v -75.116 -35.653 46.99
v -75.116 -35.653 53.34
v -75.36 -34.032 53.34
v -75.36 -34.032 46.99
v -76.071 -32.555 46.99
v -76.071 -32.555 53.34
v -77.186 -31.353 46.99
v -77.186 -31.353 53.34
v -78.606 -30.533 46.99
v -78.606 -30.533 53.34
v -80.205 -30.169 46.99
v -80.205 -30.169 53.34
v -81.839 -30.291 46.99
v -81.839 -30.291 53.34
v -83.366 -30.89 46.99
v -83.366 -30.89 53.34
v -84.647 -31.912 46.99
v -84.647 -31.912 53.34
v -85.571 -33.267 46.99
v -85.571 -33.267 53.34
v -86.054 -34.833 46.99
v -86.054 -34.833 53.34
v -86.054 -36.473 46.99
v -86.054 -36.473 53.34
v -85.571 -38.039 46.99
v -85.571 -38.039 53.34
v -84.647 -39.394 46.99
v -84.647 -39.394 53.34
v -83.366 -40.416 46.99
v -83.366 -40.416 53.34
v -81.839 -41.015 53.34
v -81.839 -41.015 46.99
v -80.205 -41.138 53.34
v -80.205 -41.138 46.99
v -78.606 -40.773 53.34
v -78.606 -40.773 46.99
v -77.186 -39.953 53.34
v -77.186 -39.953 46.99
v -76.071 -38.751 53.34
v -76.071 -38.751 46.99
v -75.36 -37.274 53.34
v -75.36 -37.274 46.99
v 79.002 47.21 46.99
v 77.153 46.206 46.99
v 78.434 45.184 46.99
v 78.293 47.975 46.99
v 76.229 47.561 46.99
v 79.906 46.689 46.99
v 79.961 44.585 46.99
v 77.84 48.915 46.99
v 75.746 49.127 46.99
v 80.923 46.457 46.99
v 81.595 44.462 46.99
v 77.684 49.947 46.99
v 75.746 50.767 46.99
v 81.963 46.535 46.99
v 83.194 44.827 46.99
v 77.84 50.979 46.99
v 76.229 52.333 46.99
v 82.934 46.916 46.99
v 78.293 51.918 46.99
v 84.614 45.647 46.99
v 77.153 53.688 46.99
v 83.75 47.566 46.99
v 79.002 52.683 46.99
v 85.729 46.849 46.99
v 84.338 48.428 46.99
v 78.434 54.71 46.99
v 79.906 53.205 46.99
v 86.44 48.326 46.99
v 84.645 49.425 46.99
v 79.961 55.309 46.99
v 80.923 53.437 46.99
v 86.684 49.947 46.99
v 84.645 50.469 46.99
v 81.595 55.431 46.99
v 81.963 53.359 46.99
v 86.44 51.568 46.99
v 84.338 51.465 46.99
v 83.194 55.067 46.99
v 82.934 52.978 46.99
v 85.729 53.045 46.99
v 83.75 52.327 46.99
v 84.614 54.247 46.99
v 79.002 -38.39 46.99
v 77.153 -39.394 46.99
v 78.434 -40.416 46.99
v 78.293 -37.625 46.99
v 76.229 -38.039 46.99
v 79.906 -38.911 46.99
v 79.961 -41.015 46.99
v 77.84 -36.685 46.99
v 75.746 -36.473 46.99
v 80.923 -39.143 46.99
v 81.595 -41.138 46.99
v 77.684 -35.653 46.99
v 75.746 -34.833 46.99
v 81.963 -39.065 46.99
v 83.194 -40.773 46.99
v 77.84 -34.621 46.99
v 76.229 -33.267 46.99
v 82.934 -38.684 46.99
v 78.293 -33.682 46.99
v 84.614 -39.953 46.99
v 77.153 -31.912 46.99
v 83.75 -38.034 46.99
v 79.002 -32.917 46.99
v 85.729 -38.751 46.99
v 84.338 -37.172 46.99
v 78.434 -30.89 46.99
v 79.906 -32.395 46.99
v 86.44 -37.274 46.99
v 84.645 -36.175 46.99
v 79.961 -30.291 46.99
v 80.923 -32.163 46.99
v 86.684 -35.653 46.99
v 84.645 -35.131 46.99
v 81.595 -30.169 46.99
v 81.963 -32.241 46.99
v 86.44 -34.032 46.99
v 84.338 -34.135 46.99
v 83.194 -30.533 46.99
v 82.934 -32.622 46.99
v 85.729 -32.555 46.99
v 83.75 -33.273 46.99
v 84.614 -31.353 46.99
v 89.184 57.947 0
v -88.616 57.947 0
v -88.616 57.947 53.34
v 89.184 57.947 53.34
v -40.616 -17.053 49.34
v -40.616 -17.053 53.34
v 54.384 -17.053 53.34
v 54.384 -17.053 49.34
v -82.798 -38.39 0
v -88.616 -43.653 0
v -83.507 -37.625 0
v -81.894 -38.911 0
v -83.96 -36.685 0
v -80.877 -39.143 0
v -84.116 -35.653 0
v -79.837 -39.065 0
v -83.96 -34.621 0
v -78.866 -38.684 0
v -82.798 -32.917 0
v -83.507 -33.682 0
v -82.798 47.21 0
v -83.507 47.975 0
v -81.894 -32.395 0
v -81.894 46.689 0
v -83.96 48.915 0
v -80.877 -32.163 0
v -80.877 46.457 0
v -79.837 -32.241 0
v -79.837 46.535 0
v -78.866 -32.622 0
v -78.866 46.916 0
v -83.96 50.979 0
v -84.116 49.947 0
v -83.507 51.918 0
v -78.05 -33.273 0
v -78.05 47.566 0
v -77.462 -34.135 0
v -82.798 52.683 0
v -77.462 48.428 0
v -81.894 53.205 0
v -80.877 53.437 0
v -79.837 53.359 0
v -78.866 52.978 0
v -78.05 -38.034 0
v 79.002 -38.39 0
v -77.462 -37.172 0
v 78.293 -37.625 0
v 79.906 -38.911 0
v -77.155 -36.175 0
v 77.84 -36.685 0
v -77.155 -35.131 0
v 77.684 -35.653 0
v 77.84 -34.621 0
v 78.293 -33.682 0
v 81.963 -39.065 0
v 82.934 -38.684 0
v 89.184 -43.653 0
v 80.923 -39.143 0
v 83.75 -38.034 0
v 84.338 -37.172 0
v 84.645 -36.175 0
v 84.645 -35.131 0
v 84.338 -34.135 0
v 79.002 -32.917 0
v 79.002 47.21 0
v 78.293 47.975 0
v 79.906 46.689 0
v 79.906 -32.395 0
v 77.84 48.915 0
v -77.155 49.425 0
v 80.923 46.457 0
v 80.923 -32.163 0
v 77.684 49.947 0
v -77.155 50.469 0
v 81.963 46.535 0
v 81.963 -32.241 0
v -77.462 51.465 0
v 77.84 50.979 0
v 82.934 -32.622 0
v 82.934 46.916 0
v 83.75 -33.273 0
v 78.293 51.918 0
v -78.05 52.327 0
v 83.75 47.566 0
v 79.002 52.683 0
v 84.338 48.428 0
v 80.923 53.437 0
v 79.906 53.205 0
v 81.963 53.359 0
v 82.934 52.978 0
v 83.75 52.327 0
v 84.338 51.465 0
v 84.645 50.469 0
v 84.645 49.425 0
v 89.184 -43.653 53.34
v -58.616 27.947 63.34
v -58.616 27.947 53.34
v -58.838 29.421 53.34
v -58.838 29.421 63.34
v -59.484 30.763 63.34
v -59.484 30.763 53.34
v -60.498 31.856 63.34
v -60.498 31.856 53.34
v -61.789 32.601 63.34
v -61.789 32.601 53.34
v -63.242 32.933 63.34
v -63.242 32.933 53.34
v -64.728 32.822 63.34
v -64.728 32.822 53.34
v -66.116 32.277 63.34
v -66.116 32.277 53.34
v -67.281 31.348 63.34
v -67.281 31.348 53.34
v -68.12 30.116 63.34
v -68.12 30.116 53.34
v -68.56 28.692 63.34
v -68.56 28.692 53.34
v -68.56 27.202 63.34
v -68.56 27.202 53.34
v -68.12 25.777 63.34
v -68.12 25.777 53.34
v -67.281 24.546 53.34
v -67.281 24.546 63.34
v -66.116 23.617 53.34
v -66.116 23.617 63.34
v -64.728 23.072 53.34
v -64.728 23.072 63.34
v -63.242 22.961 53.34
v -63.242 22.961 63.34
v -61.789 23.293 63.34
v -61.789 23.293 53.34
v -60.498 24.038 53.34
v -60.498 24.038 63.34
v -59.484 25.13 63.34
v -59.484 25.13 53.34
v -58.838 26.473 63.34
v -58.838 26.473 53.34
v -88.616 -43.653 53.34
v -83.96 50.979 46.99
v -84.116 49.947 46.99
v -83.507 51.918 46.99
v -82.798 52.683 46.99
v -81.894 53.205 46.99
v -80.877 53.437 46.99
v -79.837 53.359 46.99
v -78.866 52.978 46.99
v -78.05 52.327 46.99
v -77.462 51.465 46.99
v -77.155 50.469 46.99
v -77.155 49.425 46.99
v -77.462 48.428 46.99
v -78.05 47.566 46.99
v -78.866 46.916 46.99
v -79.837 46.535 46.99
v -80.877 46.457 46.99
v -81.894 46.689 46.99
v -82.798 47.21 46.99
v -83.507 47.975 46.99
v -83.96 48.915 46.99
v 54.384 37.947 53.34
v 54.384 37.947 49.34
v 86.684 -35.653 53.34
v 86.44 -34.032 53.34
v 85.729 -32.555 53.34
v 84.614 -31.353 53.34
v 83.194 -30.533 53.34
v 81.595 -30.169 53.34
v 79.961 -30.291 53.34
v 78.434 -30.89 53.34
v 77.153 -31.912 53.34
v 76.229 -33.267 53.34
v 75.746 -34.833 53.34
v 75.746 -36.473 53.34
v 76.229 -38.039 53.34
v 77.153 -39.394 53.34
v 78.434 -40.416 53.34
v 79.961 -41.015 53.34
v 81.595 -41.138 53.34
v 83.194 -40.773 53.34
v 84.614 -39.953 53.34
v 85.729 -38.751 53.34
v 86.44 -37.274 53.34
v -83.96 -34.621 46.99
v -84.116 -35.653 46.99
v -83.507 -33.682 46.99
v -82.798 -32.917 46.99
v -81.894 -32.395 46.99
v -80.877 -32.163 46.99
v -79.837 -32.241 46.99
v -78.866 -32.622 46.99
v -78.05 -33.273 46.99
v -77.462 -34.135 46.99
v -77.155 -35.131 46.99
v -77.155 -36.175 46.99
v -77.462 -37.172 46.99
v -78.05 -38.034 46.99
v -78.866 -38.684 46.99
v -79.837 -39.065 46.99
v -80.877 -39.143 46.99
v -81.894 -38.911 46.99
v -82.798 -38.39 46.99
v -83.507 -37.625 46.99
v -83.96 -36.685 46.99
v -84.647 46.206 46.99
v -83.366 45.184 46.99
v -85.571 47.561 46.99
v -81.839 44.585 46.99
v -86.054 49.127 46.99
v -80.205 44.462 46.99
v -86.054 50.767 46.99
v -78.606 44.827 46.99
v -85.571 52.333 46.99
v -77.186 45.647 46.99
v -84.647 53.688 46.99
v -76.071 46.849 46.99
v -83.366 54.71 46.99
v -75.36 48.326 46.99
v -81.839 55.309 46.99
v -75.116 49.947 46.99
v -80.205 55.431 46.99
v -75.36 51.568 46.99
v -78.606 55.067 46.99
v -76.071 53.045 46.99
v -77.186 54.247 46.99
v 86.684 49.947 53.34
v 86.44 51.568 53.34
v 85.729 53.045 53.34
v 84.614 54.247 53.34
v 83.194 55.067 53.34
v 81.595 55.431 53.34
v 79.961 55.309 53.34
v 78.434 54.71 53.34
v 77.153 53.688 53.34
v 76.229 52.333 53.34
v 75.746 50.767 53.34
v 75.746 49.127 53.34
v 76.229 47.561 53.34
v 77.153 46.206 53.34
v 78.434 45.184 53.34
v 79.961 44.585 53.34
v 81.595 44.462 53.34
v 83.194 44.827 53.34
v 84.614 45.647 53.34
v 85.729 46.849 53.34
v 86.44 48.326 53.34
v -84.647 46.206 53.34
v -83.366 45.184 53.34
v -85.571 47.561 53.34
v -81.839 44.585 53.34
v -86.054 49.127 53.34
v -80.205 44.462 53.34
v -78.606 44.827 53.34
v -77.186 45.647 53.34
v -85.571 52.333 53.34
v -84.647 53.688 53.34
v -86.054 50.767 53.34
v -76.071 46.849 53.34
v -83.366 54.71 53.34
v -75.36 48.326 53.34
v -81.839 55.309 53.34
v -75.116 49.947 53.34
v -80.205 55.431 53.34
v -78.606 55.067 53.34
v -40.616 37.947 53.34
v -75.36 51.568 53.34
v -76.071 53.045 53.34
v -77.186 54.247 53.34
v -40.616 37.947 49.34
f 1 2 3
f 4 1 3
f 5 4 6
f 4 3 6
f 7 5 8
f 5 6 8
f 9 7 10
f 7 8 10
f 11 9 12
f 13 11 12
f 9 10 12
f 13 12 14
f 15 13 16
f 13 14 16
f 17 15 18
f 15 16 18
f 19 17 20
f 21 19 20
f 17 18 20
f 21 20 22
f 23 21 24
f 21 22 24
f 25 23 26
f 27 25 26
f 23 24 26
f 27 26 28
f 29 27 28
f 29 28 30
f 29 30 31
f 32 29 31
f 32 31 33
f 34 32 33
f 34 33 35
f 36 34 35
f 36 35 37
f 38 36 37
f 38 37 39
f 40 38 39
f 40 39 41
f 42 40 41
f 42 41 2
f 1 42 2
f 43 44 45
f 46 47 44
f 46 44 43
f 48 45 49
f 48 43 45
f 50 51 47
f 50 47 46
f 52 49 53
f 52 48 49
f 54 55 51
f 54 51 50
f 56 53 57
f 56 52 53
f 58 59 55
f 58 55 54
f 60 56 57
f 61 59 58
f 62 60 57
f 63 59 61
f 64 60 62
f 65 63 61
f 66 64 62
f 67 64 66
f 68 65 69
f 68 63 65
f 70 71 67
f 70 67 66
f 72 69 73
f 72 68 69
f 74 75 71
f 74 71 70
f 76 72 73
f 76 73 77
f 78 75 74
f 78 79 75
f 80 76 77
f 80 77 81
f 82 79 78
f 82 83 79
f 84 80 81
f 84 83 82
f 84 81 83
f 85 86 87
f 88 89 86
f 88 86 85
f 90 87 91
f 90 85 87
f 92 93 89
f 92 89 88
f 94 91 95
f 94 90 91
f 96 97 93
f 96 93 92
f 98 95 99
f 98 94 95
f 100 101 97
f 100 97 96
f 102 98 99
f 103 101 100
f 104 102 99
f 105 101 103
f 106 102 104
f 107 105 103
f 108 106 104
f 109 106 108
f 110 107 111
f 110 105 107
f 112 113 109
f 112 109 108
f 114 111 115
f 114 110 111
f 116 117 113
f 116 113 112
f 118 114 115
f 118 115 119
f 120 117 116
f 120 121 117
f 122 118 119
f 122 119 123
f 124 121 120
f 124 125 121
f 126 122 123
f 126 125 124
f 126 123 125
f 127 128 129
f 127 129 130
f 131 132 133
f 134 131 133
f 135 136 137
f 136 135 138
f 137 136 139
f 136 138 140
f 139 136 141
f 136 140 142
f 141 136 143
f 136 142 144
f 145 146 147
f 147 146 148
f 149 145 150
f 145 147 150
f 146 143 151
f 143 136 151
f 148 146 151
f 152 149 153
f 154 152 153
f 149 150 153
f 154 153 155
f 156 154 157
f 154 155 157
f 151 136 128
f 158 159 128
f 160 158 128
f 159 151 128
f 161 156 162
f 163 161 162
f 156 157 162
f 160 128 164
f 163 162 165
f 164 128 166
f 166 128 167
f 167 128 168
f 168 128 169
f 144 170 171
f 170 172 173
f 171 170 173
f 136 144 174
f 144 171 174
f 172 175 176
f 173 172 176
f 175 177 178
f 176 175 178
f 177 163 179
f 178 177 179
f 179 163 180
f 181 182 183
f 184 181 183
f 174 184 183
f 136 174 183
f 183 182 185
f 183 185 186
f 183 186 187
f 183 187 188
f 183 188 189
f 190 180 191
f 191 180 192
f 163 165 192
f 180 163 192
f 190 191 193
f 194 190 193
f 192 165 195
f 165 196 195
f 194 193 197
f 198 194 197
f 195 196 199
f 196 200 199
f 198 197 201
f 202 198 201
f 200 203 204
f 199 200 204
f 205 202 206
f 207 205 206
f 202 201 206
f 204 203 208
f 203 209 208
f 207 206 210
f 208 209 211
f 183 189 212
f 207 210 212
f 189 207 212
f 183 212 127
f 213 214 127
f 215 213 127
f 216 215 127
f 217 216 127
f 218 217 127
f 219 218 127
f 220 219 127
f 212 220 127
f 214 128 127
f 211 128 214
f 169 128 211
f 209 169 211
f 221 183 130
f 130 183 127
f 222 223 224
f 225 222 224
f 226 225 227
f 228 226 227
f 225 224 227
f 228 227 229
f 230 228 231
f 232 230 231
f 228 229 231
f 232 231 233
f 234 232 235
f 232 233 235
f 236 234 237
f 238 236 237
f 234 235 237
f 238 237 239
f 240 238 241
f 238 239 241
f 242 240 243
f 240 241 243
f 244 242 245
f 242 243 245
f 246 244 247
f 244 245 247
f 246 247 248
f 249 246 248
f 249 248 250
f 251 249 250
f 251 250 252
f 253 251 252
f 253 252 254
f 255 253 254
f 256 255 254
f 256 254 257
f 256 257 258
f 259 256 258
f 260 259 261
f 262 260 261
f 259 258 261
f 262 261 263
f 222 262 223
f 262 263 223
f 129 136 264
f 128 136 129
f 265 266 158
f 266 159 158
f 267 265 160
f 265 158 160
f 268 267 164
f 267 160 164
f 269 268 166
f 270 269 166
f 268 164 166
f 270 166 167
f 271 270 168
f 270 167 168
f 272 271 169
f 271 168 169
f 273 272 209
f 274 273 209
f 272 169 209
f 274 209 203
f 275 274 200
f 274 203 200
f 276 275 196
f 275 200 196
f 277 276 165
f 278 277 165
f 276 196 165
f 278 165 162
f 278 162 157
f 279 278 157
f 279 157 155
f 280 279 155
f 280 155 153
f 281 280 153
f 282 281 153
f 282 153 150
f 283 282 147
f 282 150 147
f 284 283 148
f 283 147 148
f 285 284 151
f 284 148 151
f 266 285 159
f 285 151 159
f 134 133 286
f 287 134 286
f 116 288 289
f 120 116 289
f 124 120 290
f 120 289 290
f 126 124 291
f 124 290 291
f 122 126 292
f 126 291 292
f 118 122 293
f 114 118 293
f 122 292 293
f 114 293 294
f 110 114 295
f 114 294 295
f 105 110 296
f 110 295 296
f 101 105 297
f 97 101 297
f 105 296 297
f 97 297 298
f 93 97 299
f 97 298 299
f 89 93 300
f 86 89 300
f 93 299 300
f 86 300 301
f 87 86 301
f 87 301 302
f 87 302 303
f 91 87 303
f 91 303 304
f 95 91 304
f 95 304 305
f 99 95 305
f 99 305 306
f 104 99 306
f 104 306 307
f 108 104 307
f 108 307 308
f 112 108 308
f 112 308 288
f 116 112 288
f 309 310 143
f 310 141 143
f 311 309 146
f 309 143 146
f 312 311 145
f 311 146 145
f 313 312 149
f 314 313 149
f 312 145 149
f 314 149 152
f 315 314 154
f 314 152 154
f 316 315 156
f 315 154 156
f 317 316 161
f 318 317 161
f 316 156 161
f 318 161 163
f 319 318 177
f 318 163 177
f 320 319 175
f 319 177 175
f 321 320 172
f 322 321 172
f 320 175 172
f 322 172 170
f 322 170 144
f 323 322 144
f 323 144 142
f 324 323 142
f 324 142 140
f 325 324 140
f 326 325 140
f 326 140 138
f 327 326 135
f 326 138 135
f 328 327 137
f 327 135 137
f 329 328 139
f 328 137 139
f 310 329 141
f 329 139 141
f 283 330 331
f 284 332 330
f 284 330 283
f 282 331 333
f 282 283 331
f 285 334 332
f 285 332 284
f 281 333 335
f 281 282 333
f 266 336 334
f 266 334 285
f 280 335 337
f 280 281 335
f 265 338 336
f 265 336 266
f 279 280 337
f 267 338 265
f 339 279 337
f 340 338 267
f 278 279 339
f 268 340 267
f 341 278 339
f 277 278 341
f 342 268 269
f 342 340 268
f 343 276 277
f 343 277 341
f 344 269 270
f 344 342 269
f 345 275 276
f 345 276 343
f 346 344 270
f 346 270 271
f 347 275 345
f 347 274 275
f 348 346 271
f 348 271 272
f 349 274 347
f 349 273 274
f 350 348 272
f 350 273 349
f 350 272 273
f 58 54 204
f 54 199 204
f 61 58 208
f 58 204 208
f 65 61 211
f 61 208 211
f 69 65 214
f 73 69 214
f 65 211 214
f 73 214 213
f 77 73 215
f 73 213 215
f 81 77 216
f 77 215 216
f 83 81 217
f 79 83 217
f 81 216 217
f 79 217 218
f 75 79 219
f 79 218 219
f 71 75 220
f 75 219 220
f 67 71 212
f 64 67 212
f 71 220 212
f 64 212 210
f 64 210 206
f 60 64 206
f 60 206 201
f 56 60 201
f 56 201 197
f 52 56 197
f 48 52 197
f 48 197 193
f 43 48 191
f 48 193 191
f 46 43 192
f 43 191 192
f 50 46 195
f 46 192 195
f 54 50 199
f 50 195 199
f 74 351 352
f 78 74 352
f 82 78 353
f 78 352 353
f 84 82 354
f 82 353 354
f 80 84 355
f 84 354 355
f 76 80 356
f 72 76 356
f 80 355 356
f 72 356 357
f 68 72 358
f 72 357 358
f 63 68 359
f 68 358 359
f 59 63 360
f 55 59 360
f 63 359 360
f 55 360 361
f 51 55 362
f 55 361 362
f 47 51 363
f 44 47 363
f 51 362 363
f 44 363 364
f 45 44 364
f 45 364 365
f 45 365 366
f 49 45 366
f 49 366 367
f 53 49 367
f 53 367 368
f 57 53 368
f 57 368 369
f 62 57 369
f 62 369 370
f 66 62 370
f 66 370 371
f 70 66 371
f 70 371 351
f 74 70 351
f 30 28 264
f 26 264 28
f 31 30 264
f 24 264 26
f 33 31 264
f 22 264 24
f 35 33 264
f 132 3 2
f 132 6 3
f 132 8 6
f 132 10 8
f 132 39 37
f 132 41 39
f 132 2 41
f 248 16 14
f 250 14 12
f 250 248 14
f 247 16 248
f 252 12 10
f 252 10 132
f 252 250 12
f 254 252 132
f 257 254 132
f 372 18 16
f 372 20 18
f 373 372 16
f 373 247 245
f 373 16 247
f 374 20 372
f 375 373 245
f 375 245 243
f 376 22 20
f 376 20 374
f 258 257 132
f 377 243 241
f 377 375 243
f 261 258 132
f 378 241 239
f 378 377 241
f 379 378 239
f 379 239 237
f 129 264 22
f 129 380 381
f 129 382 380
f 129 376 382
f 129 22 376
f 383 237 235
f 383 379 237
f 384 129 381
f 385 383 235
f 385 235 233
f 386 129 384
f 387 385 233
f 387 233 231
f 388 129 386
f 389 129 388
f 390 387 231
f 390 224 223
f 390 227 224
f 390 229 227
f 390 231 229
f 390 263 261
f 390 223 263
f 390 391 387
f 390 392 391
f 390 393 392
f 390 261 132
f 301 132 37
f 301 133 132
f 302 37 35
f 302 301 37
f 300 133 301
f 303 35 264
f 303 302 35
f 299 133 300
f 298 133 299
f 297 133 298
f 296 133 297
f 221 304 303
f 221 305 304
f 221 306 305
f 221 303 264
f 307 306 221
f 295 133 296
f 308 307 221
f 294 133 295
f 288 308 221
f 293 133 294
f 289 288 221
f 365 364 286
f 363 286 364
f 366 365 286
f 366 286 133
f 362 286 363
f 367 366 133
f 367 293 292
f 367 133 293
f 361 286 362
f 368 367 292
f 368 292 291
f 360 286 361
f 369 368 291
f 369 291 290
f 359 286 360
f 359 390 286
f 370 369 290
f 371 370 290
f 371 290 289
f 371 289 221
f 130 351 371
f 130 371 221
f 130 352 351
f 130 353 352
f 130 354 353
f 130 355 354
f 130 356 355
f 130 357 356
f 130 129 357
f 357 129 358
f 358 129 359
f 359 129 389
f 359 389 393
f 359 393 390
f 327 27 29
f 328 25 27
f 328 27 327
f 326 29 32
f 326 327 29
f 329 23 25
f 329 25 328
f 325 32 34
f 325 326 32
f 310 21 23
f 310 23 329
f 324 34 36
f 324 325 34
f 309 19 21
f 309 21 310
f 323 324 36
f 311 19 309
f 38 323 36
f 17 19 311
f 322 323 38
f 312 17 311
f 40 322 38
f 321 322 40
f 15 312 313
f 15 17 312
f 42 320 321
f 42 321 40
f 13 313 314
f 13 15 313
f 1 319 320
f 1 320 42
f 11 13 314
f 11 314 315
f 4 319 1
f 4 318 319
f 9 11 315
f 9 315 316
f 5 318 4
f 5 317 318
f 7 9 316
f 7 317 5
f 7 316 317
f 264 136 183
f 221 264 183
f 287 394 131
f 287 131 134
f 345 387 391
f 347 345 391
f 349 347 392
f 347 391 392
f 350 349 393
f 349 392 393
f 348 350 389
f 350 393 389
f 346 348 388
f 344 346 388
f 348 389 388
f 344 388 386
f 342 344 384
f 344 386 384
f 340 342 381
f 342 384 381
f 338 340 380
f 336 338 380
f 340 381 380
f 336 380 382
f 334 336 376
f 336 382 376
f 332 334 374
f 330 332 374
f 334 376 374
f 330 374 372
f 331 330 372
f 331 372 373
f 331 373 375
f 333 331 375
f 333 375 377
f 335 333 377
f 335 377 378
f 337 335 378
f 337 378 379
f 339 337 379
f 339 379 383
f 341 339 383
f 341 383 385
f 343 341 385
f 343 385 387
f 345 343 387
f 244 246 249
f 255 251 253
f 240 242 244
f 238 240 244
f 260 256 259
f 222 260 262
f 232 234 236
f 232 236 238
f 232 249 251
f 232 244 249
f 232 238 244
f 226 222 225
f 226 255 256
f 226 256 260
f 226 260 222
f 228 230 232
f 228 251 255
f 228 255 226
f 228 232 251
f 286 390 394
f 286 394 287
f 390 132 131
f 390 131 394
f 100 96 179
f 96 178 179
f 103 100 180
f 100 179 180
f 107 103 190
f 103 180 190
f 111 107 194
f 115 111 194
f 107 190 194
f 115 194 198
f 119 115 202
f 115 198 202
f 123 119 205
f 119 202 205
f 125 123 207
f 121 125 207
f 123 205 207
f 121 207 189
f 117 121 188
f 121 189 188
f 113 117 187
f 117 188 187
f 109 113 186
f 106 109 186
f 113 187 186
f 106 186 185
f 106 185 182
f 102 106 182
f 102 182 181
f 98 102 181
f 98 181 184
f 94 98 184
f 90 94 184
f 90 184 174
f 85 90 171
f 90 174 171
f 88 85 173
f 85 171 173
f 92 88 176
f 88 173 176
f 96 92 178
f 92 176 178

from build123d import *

# Parameters (mm, degrees)
F0_W           = 177.8
F0_H           = 101.6
F1_DEPTH       = 53.34
F2_W           = 95
F2_H           = 55
F3_DEPTH       = 4
F4_D           = 7
F4_CBORE_D     = 11
F4_CBORE_DEPTH = 6.35
F2_R           = 5
F5_DEPTH       = 10


with BuildPart() as f1:
    # F0 (on Top) → F1 (new body)
    with BuildSketch(Plane.XY):
        with Locations((0.284396, 7.146878)):
            Rectangle(F0_W, F0_H)
    extrude(amount=F1_DEPTH)

    # F2 (on face) → F3 (cut)
    with BuildSketch(Plane.XY.offset(53.34)):
        with Locations((6.884396, 10.446878)):
            Rectangle(F2_W, F2_H)
    extrude(amount=-F3_DEPTH, mode=Mode.SUBTRACT)

    # F4 (through all)
    with Locations(Plane.XY.offset(53.34)):
        with Locations((-80.615604, 49.946878), (-80.615604, -35.653122), (81.184396, -35.653122), (81.184396, 49.946878)):
            CounterBoreHole(F4_D / 2, F4_CBORE_D / 2, F4_CBORE_DEPTH)

    # F2 (on face) → F5 (join)
    with BuildSketch(Plane.XY.offset(53.34)):
        with Locations((-63.615604, 27.946878)):
            Circle(F2_R)
    extrude(amount=F5_DEPTH)


solid = f1.part
